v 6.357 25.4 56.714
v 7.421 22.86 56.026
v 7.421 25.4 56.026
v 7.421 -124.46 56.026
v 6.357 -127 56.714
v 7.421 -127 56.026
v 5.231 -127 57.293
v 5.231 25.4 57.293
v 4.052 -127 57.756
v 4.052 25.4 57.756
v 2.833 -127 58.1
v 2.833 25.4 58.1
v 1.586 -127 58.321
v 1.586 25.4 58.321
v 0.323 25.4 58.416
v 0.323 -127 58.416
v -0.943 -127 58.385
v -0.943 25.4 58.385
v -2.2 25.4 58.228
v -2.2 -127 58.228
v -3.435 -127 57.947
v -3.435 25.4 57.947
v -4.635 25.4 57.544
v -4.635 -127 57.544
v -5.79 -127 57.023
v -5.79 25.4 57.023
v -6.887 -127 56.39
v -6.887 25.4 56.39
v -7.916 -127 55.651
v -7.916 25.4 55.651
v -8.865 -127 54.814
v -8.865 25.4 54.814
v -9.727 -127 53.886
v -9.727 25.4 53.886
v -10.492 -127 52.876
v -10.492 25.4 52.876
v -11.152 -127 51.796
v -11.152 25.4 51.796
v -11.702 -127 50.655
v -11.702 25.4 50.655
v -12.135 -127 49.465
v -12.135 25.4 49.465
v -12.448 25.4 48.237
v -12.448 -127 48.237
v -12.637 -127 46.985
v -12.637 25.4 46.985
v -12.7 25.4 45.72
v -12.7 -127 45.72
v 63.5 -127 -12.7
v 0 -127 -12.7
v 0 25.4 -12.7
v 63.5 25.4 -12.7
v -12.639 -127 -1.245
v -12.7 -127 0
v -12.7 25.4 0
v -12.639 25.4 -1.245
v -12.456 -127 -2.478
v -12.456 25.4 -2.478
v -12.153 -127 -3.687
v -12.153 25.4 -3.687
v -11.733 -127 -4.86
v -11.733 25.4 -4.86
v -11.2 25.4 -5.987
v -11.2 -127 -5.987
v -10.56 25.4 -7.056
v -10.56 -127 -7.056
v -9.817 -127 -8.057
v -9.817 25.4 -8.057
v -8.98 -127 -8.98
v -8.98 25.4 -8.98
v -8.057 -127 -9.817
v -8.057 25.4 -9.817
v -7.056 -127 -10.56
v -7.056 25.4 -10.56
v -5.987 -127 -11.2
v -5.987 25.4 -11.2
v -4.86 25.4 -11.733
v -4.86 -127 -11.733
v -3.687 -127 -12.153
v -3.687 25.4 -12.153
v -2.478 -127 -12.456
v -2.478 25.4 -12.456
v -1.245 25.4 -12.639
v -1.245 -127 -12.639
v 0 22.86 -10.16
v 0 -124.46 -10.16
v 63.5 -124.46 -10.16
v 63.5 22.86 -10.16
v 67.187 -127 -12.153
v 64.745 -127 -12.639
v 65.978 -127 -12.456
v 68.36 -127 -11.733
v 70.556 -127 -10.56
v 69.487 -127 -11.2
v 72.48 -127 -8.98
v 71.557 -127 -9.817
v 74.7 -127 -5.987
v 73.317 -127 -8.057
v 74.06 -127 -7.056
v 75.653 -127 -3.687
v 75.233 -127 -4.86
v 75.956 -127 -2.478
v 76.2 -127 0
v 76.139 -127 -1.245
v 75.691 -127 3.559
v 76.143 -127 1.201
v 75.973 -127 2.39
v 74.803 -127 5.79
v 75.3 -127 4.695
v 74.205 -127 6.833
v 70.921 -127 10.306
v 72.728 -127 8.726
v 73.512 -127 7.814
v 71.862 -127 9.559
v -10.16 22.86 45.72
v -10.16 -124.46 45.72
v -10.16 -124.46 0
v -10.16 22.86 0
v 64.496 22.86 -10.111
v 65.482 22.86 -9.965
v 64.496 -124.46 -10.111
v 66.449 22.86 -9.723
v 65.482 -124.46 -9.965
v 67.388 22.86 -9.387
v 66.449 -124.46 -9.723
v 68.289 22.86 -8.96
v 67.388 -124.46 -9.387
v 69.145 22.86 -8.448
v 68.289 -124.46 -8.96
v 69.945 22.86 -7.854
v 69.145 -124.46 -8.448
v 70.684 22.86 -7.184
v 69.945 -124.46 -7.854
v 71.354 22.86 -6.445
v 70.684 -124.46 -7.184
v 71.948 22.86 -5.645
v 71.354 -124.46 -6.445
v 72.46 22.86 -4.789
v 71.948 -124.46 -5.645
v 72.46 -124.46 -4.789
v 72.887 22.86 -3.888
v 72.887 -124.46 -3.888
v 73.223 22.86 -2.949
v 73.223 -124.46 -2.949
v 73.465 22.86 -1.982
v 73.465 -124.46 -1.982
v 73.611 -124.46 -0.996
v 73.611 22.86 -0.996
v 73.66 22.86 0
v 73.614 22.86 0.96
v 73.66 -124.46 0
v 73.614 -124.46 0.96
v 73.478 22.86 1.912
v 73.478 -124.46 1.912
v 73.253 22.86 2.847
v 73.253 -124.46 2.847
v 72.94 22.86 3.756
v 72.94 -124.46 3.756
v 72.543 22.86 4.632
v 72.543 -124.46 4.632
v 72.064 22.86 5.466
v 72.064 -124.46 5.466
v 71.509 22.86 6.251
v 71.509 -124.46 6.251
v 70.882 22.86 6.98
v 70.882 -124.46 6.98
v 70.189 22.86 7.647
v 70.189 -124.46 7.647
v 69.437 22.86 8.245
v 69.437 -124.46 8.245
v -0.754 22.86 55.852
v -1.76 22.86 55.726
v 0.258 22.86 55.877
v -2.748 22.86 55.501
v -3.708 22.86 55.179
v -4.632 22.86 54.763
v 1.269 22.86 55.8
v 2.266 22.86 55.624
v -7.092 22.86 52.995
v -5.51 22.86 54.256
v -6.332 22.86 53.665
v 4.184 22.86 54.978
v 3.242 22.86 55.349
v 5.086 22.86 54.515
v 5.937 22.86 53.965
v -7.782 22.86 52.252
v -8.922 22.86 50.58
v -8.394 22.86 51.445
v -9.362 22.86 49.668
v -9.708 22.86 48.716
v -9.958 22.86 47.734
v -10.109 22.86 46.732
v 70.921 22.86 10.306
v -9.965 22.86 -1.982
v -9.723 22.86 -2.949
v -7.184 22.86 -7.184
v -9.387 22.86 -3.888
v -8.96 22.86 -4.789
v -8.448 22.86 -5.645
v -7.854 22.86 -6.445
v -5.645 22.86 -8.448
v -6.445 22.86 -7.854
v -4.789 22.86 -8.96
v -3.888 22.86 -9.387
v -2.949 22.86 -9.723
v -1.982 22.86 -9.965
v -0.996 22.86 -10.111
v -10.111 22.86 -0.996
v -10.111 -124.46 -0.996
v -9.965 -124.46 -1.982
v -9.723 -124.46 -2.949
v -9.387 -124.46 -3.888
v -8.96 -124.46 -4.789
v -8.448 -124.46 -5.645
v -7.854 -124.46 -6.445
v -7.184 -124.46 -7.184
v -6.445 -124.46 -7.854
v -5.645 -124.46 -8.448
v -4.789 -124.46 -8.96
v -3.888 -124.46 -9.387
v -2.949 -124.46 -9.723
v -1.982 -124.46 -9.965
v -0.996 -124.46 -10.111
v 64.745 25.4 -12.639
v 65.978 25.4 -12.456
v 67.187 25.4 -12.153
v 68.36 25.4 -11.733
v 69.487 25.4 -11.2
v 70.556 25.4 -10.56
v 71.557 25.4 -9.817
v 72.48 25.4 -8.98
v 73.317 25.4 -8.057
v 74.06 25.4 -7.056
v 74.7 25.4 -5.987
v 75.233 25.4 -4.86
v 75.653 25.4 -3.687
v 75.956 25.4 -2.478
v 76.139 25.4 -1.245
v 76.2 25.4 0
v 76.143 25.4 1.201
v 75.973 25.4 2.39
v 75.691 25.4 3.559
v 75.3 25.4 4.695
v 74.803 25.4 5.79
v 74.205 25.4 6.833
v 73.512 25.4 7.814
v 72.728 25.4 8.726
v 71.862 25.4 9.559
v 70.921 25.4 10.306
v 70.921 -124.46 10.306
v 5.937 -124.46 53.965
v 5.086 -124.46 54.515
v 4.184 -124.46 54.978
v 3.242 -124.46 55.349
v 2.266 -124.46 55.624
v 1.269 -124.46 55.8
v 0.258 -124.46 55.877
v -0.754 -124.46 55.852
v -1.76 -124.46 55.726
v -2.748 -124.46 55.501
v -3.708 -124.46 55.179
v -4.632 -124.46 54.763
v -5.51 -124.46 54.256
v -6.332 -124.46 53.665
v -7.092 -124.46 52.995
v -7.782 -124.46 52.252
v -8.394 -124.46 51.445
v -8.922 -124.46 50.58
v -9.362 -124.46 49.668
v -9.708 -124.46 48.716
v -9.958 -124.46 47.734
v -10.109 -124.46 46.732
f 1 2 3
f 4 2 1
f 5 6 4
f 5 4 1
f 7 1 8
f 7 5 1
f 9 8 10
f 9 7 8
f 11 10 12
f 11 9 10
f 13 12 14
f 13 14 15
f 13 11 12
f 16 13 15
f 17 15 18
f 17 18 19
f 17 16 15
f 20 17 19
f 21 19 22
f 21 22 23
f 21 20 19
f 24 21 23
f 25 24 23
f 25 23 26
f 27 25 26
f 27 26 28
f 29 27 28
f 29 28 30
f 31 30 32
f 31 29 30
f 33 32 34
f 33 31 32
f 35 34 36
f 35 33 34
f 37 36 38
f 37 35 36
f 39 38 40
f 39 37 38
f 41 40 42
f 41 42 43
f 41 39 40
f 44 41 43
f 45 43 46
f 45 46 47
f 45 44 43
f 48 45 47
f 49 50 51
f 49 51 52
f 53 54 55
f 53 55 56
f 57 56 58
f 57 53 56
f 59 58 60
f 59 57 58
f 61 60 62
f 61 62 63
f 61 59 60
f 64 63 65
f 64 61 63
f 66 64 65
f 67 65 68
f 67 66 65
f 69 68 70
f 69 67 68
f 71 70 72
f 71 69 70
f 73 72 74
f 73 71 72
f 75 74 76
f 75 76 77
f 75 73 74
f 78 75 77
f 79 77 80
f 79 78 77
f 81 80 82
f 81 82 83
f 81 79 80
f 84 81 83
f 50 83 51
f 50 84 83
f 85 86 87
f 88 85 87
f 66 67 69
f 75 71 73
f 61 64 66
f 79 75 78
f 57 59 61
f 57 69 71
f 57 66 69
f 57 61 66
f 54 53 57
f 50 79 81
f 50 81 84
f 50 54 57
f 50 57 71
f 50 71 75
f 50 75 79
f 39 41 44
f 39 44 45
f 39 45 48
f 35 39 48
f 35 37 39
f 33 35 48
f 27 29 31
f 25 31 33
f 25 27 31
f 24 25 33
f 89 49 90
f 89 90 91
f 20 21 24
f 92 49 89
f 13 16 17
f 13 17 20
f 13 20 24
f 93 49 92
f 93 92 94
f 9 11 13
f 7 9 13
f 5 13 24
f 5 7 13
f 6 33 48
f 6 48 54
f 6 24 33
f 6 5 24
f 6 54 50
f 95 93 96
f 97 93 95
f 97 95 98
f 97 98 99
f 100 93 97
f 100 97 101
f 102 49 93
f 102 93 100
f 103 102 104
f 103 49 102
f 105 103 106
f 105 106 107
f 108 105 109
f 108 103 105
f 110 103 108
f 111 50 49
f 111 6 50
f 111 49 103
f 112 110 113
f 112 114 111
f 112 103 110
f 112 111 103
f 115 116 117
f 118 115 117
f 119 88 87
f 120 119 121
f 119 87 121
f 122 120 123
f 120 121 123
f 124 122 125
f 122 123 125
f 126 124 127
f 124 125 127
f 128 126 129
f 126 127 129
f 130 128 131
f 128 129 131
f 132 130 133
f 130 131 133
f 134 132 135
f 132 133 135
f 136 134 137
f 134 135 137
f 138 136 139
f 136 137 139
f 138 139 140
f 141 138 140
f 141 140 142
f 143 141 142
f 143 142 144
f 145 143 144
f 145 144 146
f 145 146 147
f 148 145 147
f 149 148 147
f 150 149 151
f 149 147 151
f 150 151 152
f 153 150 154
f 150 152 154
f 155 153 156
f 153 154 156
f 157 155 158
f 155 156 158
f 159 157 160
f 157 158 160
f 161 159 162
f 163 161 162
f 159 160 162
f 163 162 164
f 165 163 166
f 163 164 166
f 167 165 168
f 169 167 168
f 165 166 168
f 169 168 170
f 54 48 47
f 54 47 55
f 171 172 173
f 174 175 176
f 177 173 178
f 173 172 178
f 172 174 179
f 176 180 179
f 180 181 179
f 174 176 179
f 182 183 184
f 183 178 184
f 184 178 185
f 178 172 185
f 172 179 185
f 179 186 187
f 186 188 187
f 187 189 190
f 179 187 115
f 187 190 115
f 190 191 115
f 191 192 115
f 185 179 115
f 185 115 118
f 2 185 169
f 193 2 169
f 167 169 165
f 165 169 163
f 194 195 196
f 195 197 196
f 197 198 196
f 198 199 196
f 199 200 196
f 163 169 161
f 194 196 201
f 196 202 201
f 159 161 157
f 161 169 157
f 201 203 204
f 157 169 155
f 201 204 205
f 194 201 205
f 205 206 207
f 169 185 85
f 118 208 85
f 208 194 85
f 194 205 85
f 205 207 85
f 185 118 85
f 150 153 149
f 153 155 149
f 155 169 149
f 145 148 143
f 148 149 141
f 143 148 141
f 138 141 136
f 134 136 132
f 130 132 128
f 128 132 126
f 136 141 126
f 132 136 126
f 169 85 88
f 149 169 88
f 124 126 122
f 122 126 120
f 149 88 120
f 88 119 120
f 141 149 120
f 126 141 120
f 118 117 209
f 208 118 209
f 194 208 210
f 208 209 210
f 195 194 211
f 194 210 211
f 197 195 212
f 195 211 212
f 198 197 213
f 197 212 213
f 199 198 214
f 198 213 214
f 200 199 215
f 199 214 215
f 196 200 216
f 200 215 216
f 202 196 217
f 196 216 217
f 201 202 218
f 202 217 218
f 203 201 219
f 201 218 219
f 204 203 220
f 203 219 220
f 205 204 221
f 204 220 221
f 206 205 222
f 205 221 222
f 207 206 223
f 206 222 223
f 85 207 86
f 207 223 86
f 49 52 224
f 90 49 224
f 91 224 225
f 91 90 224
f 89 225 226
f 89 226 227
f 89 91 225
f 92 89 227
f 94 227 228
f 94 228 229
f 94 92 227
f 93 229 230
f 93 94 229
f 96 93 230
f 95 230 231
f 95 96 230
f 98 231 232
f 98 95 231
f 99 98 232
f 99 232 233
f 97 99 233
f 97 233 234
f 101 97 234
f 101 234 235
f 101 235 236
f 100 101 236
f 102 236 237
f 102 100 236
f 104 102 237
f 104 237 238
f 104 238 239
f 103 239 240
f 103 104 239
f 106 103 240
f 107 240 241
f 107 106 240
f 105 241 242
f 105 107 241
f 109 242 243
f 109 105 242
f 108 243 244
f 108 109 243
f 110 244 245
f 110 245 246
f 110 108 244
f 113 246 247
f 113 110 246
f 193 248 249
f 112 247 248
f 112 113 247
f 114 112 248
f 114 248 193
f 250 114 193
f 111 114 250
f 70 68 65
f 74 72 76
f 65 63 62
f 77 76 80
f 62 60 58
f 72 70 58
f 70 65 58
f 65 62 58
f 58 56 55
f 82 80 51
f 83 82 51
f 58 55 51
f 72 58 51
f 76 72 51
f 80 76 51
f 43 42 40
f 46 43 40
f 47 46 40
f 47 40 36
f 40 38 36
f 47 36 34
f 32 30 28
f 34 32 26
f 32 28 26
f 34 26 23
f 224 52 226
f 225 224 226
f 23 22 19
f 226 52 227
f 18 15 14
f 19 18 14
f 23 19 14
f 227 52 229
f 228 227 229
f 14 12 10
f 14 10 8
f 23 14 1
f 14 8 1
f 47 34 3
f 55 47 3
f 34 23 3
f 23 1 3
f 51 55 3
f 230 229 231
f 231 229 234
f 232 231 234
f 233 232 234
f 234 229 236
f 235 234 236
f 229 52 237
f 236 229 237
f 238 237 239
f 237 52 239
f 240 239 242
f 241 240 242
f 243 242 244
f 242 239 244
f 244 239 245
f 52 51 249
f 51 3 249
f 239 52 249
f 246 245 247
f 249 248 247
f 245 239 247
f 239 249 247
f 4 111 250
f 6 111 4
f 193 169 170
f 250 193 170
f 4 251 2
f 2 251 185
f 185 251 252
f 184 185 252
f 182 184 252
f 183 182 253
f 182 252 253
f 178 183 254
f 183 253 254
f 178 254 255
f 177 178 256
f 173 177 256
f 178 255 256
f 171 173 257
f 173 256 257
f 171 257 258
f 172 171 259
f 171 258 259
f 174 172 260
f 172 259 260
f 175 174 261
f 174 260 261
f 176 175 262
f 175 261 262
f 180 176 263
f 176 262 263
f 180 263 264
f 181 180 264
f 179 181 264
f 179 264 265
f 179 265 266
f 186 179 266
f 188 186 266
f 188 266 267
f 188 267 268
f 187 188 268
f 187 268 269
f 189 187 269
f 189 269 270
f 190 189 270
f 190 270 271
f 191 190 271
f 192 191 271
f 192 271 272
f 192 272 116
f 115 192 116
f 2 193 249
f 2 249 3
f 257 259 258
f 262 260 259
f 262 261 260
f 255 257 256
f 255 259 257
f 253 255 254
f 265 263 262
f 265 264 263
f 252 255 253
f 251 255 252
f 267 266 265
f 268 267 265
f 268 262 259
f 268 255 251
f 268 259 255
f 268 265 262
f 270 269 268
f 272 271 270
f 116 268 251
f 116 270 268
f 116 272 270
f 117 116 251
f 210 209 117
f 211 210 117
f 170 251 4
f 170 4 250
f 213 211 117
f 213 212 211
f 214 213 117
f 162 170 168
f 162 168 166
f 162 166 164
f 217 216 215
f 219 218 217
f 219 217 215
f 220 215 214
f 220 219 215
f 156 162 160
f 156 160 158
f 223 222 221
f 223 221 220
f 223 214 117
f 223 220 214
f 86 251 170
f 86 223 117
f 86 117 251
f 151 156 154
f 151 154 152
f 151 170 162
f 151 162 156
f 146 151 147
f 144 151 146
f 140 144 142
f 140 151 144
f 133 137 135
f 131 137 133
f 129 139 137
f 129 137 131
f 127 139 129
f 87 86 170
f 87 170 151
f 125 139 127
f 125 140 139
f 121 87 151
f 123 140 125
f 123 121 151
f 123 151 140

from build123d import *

# Parameters (mm, degrees)
F1_DEPTH      = 127
F1_DEPTH_BACK = 25.4
F3_T          = -2.54


# Not quite as in the source:
# - a feature of the source that left no trace in its solid (it failed there, or was rolled back) is left out
# - a shell that OpenCascade refuses in one call is made with other operations: the cavity is built on its own and cut out


with BuildPart() as f1:
    # F0 (on Front) → F1 (new body, two sides)
    with BuildSketch(Plane.XZ) as f1_sk:
        with BuildLine():
            ThreePointArc((-12.7, 45.72), (0, 33.02), (12.7, 45.72))
            ThreePointArc((12.7, 45.72), (11.3033735945, 51.5099693768), (7.4206700182, 56.0264861364))
            ThreePointArc((7.4206700182, 56.0264861364), (-5.7899693768, 57.0233735945), (-12.7, 45.72))
        make_face()
        with BuildLine():
            ThreePointArc((7.4206700182, 56.0264861364), (11.3033735945, 51.5099693768), (12.7, 45.72))
            ThreePointArc((12.7, 45.72), (0, 33.02), (-12.7, 45.72))
            Line((-12.7, 45.72), (-12.7, 0))
            ThreePointArc((-12.7, 0), (0, 12.7), (12.7, 0))
            ThreePointArc((12.7, 0), (8.9802561211, -8.9802561211), (0, -12.7))
            Line((0, -12.7), (63.5, -12.7))
            ThreePointArc((63.5, -12.7), (51.4131812719, 3.8985655097), (70.9206700182, 10.3064861364))
            Line((70.9206700182, 10.3064861364), (7.4206700182, 56.0264861364))
        make_face()
        with BuildLine():
            ThreePointArc((76.2, 0), (74.8033735945, 5.7899693768), (70.9206700182, 10.3064861364))
            ThreePointArc((70.9206700182, 10.3064861364), (51.4131812719, 3.8985655097), (63.5, -12.7))
            ThreePointArc((63.5, -12.7), (72.4802561211, -8.9802561211), (76.2, 0))
        make_face()
        with BuildLine():
            ThreePointArc((12.7, 0), (0, 12.7), (-12.7, 0))
            ThreePointArc((-12.7, 0), (-8.9802561211, -8.9802561211), (0, -12.7))
            ThreePointArc((0, -12.7), (8.9802561211, -8.9802561211), (12.7, 0))
        make_face()
    extrude(amount=F1_DEPTH)
    extrude(f1_sk.sketch, amount=-F1_DEPTH_BACK)

    # F3: a shell. OpenCascade refuses it in one call, so the cavity is built on its own and cut out:
    # the body offset inwards by the wall thickness, plus a prism from it out through each open face.
    f3_core = offset(f1.part, amount=F3_T, mode=Mode.PRIVATE)
    f3_exits = [f3_core.faces().sort_by_distance(p)[0] for p in [
        (37.686536, -50.8, 31.105189),
    ]]
    add(f3_core, mode=Mode.SUBTRACT)
    extrude(f3_exits, amount=-F3_T, mode=Mode.SUBTRACT)


solid = f1.part
